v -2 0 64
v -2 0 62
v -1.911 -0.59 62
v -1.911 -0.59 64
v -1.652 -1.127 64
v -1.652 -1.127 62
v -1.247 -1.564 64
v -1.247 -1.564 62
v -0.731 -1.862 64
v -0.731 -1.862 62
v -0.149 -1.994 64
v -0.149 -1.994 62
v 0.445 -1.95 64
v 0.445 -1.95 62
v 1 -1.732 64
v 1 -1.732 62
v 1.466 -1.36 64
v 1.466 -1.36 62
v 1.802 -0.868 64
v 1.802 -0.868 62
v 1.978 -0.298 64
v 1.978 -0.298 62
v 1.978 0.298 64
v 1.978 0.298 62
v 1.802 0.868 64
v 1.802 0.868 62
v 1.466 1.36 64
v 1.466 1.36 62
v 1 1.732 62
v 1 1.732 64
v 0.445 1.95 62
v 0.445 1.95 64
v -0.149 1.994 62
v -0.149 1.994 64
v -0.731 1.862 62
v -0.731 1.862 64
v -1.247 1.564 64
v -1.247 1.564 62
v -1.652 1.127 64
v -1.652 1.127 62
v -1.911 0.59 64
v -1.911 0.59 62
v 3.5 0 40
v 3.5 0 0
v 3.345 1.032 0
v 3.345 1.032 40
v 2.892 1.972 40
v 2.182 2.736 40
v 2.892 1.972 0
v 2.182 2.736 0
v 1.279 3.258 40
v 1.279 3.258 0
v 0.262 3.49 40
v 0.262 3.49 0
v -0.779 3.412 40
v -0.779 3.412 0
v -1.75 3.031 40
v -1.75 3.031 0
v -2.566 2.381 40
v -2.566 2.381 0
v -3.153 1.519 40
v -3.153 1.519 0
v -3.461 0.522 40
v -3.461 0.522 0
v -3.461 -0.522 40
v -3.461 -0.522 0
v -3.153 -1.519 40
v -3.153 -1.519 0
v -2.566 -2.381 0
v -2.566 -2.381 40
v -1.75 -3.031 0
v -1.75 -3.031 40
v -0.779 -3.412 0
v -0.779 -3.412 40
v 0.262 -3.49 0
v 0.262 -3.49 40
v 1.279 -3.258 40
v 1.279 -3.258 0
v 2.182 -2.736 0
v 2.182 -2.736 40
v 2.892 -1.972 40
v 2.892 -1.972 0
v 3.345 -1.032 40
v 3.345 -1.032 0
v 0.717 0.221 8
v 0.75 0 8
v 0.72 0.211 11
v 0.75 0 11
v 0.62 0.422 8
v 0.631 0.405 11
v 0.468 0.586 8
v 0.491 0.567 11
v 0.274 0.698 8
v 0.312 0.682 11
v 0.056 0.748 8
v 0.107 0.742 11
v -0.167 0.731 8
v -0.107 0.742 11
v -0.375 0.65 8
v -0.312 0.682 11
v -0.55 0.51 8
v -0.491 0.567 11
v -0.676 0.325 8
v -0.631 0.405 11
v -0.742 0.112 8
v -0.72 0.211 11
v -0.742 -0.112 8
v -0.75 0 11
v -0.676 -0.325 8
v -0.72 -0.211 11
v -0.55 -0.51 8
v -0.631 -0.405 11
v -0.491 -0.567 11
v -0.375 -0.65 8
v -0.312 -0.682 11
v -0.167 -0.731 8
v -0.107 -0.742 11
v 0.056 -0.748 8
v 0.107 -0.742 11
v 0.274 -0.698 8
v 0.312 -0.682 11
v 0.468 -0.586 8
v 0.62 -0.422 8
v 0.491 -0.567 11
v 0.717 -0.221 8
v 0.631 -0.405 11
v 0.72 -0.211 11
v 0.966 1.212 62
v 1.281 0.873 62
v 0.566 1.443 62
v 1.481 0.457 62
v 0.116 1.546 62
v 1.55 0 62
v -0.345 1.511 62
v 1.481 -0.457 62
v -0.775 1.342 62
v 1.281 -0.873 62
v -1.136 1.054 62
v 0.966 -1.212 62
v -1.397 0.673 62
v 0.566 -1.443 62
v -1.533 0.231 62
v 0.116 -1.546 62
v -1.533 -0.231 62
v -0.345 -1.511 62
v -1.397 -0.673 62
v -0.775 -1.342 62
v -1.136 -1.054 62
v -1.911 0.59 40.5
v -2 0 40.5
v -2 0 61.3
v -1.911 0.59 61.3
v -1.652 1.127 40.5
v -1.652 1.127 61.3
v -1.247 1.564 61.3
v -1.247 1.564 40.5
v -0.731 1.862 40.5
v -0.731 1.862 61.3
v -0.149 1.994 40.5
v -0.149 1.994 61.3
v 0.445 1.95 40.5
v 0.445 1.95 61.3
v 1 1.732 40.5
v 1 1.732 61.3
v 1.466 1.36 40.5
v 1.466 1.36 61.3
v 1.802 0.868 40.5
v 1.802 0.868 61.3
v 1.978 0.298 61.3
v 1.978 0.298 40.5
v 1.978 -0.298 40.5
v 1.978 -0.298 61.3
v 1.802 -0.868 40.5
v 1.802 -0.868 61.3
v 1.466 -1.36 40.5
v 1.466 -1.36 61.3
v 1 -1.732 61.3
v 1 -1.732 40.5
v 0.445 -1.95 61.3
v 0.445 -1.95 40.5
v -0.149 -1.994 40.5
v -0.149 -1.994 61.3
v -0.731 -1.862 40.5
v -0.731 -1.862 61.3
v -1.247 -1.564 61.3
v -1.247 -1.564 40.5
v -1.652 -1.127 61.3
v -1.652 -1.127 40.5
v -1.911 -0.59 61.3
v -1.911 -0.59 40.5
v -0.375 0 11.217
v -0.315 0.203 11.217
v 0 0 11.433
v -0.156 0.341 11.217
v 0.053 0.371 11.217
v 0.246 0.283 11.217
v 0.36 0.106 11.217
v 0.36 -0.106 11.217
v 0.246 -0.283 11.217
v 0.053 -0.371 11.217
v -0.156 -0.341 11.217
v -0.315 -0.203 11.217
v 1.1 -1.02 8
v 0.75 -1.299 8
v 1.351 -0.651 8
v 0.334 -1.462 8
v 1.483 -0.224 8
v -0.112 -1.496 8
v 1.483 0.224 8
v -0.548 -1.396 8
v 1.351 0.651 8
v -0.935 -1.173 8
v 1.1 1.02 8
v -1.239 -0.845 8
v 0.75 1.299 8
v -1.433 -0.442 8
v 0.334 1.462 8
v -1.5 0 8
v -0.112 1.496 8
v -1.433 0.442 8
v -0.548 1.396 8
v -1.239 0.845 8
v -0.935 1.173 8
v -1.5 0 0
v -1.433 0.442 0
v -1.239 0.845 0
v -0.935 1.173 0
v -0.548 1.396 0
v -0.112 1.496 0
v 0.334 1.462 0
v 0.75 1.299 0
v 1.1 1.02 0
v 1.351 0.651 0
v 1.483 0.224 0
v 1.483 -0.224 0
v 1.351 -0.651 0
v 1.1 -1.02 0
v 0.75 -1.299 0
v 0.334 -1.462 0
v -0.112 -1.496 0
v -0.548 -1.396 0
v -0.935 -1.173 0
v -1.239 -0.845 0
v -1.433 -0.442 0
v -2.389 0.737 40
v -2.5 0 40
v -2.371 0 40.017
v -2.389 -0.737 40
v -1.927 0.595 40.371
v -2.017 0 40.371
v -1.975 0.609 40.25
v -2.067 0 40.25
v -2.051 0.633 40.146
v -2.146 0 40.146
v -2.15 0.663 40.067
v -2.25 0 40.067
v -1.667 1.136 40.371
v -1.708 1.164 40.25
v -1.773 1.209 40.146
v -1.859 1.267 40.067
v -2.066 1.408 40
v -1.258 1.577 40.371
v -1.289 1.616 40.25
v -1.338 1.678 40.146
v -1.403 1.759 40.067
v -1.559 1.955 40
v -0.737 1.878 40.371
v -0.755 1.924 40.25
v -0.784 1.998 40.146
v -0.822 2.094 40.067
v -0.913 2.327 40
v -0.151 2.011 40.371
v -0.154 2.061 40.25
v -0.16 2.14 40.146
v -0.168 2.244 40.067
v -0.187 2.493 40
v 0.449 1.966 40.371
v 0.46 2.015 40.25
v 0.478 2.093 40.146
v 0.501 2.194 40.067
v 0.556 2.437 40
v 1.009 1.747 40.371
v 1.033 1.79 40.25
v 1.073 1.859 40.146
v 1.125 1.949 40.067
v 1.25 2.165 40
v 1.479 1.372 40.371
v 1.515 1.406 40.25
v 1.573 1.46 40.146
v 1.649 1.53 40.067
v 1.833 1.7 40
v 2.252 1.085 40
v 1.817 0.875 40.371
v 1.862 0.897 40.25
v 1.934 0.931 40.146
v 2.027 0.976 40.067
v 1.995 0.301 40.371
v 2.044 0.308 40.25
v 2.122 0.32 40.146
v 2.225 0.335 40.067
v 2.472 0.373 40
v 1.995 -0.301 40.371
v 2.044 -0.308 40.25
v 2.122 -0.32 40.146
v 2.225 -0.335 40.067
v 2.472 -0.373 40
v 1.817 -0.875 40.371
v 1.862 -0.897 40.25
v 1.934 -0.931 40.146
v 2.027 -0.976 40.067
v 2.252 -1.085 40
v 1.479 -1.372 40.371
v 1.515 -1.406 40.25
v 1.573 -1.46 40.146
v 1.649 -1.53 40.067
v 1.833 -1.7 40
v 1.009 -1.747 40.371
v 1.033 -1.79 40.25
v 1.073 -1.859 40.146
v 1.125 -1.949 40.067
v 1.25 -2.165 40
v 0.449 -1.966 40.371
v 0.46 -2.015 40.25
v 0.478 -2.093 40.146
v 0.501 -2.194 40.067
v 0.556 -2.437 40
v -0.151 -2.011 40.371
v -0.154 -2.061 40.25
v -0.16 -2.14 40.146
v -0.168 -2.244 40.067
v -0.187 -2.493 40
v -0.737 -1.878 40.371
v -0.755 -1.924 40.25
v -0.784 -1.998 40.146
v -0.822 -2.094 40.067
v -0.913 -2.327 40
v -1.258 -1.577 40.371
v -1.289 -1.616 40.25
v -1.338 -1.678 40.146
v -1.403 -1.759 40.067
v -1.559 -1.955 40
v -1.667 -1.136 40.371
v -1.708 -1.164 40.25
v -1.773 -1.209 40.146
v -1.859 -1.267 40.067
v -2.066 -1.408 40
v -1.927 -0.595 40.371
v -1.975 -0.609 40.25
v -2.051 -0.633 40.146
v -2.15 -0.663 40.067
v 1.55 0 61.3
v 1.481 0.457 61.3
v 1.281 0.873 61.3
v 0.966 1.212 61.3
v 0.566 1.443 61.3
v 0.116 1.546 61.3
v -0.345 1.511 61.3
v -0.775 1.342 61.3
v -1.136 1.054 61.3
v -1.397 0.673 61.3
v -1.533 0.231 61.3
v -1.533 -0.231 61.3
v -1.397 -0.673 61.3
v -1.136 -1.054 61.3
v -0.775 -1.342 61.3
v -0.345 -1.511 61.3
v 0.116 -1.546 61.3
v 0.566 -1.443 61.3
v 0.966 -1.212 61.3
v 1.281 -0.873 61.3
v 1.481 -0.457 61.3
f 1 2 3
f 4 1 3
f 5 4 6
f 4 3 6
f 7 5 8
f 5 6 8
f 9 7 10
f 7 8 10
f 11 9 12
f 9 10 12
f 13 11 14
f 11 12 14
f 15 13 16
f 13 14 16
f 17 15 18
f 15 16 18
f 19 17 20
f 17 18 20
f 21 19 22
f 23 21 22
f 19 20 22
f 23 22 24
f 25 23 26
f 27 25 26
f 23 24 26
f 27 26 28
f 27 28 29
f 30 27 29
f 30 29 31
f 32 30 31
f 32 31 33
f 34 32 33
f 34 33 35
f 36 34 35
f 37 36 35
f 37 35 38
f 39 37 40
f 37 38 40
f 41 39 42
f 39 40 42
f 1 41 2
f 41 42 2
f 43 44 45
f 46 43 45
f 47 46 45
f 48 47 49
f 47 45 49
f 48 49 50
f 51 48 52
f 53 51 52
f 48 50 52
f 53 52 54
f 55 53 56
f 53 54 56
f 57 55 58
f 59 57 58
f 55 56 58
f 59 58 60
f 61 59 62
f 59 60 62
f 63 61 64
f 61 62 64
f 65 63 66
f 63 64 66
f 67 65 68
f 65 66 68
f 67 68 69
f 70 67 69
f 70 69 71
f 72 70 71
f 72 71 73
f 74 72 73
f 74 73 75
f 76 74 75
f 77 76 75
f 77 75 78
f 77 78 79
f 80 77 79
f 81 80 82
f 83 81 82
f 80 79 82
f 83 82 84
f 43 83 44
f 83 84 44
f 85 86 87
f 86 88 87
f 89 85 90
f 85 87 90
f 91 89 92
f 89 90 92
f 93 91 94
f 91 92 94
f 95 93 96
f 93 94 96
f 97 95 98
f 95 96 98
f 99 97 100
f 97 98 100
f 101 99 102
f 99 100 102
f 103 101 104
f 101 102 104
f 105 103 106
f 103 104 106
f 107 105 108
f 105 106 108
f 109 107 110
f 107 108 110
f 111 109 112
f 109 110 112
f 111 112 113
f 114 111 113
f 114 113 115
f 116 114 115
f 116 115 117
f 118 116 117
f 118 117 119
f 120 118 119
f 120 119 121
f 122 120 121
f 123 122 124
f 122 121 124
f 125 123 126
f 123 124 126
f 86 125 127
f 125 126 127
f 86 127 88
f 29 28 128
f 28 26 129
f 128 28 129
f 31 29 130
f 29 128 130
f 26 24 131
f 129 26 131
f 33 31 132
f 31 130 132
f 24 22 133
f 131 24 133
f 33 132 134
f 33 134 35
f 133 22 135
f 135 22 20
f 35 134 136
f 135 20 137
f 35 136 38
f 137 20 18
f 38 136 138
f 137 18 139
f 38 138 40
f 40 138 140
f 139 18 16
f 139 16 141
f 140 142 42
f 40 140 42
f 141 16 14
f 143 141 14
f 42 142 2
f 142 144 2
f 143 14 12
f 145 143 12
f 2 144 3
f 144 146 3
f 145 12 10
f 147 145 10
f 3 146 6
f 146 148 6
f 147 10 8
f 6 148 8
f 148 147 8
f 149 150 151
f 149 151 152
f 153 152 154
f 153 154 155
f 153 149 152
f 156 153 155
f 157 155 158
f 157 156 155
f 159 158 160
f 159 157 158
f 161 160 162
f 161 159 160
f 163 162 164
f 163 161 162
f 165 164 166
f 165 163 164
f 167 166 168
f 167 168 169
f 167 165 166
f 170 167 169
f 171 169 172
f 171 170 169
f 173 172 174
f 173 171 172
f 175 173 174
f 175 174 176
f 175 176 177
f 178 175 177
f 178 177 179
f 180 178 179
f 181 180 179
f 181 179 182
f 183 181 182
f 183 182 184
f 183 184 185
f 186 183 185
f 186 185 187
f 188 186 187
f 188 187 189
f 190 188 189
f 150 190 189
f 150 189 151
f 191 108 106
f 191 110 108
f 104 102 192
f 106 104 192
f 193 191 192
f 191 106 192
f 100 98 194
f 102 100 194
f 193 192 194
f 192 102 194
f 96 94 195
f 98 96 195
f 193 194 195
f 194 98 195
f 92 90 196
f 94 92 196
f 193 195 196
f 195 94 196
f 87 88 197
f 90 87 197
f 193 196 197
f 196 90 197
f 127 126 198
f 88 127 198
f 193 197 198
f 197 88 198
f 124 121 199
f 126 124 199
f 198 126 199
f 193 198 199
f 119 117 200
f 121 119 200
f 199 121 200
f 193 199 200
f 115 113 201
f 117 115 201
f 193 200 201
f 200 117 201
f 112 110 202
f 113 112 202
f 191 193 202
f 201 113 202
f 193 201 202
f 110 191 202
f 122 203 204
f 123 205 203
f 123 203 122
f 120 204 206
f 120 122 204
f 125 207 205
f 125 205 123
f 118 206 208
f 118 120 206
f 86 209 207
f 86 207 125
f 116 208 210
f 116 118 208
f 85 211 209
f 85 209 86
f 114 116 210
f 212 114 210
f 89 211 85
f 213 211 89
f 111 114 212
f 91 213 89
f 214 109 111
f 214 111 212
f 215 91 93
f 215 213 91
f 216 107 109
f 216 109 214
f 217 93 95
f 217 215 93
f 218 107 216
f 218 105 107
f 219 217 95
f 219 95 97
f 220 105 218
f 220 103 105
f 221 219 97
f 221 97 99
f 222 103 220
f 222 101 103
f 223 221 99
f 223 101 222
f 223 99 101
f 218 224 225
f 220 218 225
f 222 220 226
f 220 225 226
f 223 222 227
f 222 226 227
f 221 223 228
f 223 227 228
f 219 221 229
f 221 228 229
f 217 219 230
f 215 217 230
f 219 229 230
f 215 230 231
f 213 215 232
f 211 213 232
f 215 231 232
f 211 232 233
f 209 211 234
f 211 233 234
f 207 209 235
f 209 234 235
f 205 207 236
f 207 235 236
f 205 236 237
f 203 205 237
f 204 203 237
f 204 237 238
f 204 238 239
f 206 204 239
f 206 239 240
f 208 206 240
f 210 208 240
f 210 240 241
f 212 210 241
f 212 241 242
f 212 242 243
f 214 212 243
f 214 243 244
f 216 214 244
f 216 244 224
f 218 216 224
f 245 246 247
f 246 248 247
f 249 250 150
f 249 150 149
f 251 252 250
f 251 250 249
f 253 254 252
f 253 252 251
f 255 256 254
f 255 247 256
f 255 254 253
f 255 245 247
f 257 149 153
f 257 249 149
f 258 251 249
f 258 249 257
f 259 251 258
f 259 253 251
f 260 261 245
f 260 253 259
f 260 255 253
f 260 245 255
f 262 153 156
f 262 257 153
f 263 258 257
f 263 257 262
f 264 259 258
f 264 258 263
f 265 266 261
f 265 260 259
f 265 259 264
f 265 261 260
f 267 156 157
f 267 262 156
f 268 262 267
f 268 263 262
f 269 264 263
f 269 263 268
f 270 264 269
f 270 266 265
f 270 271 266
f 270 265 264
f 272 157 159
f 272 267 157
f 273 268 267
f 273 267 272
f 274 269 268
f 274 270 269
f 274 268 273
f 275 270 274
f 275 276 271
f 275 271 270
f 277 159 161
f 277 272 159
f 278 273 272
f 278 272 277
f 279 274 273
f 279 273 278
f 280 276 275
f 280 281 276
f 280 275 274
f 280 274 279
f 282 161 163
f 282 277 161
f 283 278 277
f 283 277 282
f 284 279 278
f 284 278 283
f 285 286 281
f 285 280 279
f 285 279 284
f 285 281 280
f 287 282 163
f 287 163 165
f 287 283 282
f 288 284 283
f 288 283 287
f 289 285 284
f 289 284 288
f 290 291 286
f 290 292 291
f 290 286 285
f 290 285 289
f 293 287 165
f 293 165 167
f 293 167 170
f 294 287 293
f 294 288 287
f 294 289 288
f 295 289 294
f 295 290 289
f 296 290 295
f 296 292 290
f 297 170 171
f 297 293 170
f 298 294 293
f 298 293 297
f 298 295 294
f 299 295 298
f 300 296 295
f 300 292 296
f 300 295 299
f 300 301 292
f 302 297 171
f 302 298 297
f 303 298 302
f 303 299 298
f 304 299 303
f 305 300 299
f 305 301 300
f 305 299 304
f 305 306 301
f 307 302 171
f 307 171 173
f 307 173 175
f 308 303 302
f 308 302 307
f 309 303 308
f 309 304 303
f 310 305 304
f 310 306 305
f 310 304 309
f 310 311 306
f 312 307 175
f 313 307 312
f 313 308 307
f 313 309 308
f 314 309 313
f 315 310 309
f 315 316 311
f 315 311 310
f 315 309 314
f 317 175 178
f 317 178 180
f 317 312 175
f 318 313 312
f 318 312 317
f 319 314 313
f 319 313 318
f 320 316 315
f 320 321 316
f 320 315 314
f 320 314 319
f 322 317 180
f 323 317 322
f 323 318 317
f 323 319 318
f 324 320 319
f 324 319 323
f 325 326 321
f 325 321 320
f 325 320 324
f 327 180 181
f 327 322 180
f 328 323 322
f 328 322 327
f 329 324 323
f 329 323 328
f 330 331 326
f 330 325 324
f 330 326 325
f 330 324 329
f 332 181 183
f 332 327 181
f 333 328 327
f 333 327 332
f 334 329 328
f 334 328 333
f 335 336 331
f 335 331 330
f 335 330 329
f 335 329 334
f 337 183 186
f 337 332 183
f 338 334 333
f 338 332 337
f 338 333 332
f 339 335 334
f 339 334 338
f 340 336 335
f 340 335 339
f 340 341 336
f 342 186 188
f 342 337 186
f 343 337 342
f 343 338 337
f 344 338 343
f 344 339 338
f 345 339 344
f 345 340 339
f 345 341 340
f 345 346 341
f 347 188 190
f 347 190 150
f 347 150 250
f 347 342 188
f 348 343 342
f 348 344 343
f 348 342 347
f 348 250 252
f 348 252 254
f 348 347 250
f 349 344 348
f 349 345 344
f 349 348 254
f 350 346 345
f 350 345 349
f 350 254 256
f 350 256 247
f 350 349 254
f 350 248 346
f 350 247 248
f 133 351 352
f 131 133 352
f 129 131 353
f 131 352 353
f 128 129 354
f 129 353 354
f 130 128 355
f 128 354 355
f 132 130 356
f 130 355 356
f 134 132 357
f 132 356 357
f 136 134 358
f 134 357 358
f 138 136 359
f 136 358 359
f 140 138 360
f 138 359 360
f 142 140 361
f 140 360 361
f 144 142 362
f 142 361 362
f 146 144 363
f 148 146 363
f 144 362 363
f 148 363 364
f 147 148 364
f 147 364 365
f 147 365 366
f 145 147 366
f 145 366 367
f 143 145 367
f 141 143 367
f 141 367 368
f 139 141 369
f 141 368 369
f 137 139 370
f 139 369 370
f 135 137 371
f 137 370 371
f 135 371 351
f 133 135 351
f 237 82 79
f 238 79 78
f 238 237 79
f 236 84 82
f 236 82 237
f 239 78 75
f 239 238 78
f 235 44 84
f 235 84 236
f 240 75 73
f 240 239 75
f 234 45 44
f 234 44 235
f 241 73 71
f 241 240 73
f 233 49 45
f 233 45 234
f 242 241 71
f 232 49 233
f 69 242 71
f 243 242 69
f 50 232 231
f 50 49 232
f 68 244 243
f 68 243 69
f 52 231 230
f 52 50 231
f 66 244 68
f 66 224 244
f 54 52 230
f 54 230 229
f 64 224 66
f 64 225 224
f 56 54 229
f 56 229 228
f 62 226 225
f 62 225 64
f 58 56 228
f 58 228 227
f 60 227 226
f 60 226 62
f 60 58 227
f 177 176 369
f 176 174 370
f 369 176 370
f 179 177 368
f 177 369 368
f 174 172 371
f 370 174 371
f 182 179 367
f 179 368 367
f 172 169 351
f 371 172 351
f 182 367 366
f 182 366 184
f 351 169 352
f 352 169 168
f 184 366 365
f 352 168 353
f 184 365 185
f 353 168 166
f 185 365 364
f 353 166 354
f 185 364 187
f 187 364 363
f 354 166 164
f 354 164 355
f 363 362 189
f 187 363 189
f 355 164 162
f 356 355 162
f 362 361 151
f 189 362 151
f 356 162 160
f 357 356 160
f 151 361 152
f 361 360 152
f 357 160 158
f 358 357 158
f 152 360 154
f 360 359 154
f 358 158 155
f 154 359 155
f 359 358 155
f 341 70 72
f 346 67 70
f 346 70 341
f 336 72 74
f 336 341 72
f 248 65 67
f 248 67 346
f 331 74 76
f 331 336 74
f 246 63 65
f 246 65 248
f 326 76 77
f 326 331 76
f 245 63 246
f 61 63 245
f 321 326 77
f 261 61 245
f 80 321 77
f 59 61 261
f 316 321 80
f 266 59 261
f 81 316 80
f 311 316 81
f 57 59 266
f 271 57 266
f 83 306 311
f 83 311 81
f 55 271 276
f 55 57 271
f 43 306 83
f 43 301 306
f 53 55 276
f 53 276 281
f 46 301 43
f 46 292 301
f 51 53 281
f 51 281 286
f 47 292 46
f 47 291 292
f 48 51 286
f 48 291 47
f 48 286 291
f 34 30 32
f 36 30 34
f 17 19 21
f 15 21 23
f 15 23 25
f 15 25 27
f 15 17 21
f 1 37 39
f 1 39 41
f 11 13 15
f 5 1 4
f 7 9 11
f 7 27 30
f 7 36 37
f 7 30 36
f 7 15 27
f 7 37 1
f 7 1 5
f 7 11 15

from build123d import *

# Parameters (mm, degrees)
ESQUISSE1_R          = 3.5
BASE_EXTRUSION_DEPTH = 40
ESQUISSE2_R          = 2
BOSS_EXTRU_1_DEPTH   = 61.3
ESQUISSE3_R          = 1.55
BOSS_EXTRU_2_DEPTH   = 0.7
ESQUISSE4_R          = 2
BOSS_EXTRU_3_DEPTH   = 2
CONG_1_R             = 0.5
PER_AGE1_D           = 1.5
PER_AGE1_DEPTH       = 11
PER_AGE1_CBORE_D     = 3
PER_AGE1_CBORE_DEPTH = 8
PER_AGE1_TIP         = 0.433012702


with BuildPart() as part:
    # Esquisse1 → Base-Extrusion (new body)
    with BuildSketch(Plane.XY):
        Circle(ESQUISSE1_R)
    extrude(amount=BASE_EXTRUSION_DEPTH)

    # Esquisse2 → Boss.-Extru.1 (add)
    with BuildSketch(Plane(origin=(0, 0, 0), x_dir=(-1, 0, 0), z_dir=(0, 0, -1))):
        Circle(ESQUISSE2_R)
    extrude(amount=-BOSS_EXTRU_1_DEPTH)

    # Esquisse3 → Boss.-Extru.2 (add)
    with BuildSketch(Plane.XY.offset(61.3)):
        Circle(ESQUISSE3_R)
    extrude(amount=BOSS_EXTRU_2_DEPTH)

    # Esquisse4 → Boss.-Extru.3 (add)
    with BuildSketch(Plane.XY.offset(62)):
        with Locations(Location((0, 0, 0), (0, 0, 180))):
            Circle(ESQUISSE4_R)
    extrude(amount=BOSS_EXTRU_3_DEPTH)

    # Congé1
    cong_1_edges = [part.edges().sort_by_distance(p)[0] for p in [
        (2, 0, 40),
    ]]
    fillet(cong_1_edges, radius=CONG_1_R)

    # Perçage1
    with Locations(Plane(origin=(0, 0, 0), x_dir=(-1, 0, 0), z_dir=(0, 0, -1))):
        with Locations((0, 0)):
            CounterBoreHole(PER_AGE1_D / 2, PER_AGE1_CBORE_D / 2, PER_AGE1_CBORE_DEPTH, depth=PER_AGE1_DEPTH)
            with Locations((0, 0, -(PER_AGE1_DEPTH + PER_AGE1_TIP / 2))):  # 120° drill point
                Cone(0, PER_AGE1_D / 2, PER_AGE1_TIP, mode=Mode.SUBTRACT)


solid = part.part
